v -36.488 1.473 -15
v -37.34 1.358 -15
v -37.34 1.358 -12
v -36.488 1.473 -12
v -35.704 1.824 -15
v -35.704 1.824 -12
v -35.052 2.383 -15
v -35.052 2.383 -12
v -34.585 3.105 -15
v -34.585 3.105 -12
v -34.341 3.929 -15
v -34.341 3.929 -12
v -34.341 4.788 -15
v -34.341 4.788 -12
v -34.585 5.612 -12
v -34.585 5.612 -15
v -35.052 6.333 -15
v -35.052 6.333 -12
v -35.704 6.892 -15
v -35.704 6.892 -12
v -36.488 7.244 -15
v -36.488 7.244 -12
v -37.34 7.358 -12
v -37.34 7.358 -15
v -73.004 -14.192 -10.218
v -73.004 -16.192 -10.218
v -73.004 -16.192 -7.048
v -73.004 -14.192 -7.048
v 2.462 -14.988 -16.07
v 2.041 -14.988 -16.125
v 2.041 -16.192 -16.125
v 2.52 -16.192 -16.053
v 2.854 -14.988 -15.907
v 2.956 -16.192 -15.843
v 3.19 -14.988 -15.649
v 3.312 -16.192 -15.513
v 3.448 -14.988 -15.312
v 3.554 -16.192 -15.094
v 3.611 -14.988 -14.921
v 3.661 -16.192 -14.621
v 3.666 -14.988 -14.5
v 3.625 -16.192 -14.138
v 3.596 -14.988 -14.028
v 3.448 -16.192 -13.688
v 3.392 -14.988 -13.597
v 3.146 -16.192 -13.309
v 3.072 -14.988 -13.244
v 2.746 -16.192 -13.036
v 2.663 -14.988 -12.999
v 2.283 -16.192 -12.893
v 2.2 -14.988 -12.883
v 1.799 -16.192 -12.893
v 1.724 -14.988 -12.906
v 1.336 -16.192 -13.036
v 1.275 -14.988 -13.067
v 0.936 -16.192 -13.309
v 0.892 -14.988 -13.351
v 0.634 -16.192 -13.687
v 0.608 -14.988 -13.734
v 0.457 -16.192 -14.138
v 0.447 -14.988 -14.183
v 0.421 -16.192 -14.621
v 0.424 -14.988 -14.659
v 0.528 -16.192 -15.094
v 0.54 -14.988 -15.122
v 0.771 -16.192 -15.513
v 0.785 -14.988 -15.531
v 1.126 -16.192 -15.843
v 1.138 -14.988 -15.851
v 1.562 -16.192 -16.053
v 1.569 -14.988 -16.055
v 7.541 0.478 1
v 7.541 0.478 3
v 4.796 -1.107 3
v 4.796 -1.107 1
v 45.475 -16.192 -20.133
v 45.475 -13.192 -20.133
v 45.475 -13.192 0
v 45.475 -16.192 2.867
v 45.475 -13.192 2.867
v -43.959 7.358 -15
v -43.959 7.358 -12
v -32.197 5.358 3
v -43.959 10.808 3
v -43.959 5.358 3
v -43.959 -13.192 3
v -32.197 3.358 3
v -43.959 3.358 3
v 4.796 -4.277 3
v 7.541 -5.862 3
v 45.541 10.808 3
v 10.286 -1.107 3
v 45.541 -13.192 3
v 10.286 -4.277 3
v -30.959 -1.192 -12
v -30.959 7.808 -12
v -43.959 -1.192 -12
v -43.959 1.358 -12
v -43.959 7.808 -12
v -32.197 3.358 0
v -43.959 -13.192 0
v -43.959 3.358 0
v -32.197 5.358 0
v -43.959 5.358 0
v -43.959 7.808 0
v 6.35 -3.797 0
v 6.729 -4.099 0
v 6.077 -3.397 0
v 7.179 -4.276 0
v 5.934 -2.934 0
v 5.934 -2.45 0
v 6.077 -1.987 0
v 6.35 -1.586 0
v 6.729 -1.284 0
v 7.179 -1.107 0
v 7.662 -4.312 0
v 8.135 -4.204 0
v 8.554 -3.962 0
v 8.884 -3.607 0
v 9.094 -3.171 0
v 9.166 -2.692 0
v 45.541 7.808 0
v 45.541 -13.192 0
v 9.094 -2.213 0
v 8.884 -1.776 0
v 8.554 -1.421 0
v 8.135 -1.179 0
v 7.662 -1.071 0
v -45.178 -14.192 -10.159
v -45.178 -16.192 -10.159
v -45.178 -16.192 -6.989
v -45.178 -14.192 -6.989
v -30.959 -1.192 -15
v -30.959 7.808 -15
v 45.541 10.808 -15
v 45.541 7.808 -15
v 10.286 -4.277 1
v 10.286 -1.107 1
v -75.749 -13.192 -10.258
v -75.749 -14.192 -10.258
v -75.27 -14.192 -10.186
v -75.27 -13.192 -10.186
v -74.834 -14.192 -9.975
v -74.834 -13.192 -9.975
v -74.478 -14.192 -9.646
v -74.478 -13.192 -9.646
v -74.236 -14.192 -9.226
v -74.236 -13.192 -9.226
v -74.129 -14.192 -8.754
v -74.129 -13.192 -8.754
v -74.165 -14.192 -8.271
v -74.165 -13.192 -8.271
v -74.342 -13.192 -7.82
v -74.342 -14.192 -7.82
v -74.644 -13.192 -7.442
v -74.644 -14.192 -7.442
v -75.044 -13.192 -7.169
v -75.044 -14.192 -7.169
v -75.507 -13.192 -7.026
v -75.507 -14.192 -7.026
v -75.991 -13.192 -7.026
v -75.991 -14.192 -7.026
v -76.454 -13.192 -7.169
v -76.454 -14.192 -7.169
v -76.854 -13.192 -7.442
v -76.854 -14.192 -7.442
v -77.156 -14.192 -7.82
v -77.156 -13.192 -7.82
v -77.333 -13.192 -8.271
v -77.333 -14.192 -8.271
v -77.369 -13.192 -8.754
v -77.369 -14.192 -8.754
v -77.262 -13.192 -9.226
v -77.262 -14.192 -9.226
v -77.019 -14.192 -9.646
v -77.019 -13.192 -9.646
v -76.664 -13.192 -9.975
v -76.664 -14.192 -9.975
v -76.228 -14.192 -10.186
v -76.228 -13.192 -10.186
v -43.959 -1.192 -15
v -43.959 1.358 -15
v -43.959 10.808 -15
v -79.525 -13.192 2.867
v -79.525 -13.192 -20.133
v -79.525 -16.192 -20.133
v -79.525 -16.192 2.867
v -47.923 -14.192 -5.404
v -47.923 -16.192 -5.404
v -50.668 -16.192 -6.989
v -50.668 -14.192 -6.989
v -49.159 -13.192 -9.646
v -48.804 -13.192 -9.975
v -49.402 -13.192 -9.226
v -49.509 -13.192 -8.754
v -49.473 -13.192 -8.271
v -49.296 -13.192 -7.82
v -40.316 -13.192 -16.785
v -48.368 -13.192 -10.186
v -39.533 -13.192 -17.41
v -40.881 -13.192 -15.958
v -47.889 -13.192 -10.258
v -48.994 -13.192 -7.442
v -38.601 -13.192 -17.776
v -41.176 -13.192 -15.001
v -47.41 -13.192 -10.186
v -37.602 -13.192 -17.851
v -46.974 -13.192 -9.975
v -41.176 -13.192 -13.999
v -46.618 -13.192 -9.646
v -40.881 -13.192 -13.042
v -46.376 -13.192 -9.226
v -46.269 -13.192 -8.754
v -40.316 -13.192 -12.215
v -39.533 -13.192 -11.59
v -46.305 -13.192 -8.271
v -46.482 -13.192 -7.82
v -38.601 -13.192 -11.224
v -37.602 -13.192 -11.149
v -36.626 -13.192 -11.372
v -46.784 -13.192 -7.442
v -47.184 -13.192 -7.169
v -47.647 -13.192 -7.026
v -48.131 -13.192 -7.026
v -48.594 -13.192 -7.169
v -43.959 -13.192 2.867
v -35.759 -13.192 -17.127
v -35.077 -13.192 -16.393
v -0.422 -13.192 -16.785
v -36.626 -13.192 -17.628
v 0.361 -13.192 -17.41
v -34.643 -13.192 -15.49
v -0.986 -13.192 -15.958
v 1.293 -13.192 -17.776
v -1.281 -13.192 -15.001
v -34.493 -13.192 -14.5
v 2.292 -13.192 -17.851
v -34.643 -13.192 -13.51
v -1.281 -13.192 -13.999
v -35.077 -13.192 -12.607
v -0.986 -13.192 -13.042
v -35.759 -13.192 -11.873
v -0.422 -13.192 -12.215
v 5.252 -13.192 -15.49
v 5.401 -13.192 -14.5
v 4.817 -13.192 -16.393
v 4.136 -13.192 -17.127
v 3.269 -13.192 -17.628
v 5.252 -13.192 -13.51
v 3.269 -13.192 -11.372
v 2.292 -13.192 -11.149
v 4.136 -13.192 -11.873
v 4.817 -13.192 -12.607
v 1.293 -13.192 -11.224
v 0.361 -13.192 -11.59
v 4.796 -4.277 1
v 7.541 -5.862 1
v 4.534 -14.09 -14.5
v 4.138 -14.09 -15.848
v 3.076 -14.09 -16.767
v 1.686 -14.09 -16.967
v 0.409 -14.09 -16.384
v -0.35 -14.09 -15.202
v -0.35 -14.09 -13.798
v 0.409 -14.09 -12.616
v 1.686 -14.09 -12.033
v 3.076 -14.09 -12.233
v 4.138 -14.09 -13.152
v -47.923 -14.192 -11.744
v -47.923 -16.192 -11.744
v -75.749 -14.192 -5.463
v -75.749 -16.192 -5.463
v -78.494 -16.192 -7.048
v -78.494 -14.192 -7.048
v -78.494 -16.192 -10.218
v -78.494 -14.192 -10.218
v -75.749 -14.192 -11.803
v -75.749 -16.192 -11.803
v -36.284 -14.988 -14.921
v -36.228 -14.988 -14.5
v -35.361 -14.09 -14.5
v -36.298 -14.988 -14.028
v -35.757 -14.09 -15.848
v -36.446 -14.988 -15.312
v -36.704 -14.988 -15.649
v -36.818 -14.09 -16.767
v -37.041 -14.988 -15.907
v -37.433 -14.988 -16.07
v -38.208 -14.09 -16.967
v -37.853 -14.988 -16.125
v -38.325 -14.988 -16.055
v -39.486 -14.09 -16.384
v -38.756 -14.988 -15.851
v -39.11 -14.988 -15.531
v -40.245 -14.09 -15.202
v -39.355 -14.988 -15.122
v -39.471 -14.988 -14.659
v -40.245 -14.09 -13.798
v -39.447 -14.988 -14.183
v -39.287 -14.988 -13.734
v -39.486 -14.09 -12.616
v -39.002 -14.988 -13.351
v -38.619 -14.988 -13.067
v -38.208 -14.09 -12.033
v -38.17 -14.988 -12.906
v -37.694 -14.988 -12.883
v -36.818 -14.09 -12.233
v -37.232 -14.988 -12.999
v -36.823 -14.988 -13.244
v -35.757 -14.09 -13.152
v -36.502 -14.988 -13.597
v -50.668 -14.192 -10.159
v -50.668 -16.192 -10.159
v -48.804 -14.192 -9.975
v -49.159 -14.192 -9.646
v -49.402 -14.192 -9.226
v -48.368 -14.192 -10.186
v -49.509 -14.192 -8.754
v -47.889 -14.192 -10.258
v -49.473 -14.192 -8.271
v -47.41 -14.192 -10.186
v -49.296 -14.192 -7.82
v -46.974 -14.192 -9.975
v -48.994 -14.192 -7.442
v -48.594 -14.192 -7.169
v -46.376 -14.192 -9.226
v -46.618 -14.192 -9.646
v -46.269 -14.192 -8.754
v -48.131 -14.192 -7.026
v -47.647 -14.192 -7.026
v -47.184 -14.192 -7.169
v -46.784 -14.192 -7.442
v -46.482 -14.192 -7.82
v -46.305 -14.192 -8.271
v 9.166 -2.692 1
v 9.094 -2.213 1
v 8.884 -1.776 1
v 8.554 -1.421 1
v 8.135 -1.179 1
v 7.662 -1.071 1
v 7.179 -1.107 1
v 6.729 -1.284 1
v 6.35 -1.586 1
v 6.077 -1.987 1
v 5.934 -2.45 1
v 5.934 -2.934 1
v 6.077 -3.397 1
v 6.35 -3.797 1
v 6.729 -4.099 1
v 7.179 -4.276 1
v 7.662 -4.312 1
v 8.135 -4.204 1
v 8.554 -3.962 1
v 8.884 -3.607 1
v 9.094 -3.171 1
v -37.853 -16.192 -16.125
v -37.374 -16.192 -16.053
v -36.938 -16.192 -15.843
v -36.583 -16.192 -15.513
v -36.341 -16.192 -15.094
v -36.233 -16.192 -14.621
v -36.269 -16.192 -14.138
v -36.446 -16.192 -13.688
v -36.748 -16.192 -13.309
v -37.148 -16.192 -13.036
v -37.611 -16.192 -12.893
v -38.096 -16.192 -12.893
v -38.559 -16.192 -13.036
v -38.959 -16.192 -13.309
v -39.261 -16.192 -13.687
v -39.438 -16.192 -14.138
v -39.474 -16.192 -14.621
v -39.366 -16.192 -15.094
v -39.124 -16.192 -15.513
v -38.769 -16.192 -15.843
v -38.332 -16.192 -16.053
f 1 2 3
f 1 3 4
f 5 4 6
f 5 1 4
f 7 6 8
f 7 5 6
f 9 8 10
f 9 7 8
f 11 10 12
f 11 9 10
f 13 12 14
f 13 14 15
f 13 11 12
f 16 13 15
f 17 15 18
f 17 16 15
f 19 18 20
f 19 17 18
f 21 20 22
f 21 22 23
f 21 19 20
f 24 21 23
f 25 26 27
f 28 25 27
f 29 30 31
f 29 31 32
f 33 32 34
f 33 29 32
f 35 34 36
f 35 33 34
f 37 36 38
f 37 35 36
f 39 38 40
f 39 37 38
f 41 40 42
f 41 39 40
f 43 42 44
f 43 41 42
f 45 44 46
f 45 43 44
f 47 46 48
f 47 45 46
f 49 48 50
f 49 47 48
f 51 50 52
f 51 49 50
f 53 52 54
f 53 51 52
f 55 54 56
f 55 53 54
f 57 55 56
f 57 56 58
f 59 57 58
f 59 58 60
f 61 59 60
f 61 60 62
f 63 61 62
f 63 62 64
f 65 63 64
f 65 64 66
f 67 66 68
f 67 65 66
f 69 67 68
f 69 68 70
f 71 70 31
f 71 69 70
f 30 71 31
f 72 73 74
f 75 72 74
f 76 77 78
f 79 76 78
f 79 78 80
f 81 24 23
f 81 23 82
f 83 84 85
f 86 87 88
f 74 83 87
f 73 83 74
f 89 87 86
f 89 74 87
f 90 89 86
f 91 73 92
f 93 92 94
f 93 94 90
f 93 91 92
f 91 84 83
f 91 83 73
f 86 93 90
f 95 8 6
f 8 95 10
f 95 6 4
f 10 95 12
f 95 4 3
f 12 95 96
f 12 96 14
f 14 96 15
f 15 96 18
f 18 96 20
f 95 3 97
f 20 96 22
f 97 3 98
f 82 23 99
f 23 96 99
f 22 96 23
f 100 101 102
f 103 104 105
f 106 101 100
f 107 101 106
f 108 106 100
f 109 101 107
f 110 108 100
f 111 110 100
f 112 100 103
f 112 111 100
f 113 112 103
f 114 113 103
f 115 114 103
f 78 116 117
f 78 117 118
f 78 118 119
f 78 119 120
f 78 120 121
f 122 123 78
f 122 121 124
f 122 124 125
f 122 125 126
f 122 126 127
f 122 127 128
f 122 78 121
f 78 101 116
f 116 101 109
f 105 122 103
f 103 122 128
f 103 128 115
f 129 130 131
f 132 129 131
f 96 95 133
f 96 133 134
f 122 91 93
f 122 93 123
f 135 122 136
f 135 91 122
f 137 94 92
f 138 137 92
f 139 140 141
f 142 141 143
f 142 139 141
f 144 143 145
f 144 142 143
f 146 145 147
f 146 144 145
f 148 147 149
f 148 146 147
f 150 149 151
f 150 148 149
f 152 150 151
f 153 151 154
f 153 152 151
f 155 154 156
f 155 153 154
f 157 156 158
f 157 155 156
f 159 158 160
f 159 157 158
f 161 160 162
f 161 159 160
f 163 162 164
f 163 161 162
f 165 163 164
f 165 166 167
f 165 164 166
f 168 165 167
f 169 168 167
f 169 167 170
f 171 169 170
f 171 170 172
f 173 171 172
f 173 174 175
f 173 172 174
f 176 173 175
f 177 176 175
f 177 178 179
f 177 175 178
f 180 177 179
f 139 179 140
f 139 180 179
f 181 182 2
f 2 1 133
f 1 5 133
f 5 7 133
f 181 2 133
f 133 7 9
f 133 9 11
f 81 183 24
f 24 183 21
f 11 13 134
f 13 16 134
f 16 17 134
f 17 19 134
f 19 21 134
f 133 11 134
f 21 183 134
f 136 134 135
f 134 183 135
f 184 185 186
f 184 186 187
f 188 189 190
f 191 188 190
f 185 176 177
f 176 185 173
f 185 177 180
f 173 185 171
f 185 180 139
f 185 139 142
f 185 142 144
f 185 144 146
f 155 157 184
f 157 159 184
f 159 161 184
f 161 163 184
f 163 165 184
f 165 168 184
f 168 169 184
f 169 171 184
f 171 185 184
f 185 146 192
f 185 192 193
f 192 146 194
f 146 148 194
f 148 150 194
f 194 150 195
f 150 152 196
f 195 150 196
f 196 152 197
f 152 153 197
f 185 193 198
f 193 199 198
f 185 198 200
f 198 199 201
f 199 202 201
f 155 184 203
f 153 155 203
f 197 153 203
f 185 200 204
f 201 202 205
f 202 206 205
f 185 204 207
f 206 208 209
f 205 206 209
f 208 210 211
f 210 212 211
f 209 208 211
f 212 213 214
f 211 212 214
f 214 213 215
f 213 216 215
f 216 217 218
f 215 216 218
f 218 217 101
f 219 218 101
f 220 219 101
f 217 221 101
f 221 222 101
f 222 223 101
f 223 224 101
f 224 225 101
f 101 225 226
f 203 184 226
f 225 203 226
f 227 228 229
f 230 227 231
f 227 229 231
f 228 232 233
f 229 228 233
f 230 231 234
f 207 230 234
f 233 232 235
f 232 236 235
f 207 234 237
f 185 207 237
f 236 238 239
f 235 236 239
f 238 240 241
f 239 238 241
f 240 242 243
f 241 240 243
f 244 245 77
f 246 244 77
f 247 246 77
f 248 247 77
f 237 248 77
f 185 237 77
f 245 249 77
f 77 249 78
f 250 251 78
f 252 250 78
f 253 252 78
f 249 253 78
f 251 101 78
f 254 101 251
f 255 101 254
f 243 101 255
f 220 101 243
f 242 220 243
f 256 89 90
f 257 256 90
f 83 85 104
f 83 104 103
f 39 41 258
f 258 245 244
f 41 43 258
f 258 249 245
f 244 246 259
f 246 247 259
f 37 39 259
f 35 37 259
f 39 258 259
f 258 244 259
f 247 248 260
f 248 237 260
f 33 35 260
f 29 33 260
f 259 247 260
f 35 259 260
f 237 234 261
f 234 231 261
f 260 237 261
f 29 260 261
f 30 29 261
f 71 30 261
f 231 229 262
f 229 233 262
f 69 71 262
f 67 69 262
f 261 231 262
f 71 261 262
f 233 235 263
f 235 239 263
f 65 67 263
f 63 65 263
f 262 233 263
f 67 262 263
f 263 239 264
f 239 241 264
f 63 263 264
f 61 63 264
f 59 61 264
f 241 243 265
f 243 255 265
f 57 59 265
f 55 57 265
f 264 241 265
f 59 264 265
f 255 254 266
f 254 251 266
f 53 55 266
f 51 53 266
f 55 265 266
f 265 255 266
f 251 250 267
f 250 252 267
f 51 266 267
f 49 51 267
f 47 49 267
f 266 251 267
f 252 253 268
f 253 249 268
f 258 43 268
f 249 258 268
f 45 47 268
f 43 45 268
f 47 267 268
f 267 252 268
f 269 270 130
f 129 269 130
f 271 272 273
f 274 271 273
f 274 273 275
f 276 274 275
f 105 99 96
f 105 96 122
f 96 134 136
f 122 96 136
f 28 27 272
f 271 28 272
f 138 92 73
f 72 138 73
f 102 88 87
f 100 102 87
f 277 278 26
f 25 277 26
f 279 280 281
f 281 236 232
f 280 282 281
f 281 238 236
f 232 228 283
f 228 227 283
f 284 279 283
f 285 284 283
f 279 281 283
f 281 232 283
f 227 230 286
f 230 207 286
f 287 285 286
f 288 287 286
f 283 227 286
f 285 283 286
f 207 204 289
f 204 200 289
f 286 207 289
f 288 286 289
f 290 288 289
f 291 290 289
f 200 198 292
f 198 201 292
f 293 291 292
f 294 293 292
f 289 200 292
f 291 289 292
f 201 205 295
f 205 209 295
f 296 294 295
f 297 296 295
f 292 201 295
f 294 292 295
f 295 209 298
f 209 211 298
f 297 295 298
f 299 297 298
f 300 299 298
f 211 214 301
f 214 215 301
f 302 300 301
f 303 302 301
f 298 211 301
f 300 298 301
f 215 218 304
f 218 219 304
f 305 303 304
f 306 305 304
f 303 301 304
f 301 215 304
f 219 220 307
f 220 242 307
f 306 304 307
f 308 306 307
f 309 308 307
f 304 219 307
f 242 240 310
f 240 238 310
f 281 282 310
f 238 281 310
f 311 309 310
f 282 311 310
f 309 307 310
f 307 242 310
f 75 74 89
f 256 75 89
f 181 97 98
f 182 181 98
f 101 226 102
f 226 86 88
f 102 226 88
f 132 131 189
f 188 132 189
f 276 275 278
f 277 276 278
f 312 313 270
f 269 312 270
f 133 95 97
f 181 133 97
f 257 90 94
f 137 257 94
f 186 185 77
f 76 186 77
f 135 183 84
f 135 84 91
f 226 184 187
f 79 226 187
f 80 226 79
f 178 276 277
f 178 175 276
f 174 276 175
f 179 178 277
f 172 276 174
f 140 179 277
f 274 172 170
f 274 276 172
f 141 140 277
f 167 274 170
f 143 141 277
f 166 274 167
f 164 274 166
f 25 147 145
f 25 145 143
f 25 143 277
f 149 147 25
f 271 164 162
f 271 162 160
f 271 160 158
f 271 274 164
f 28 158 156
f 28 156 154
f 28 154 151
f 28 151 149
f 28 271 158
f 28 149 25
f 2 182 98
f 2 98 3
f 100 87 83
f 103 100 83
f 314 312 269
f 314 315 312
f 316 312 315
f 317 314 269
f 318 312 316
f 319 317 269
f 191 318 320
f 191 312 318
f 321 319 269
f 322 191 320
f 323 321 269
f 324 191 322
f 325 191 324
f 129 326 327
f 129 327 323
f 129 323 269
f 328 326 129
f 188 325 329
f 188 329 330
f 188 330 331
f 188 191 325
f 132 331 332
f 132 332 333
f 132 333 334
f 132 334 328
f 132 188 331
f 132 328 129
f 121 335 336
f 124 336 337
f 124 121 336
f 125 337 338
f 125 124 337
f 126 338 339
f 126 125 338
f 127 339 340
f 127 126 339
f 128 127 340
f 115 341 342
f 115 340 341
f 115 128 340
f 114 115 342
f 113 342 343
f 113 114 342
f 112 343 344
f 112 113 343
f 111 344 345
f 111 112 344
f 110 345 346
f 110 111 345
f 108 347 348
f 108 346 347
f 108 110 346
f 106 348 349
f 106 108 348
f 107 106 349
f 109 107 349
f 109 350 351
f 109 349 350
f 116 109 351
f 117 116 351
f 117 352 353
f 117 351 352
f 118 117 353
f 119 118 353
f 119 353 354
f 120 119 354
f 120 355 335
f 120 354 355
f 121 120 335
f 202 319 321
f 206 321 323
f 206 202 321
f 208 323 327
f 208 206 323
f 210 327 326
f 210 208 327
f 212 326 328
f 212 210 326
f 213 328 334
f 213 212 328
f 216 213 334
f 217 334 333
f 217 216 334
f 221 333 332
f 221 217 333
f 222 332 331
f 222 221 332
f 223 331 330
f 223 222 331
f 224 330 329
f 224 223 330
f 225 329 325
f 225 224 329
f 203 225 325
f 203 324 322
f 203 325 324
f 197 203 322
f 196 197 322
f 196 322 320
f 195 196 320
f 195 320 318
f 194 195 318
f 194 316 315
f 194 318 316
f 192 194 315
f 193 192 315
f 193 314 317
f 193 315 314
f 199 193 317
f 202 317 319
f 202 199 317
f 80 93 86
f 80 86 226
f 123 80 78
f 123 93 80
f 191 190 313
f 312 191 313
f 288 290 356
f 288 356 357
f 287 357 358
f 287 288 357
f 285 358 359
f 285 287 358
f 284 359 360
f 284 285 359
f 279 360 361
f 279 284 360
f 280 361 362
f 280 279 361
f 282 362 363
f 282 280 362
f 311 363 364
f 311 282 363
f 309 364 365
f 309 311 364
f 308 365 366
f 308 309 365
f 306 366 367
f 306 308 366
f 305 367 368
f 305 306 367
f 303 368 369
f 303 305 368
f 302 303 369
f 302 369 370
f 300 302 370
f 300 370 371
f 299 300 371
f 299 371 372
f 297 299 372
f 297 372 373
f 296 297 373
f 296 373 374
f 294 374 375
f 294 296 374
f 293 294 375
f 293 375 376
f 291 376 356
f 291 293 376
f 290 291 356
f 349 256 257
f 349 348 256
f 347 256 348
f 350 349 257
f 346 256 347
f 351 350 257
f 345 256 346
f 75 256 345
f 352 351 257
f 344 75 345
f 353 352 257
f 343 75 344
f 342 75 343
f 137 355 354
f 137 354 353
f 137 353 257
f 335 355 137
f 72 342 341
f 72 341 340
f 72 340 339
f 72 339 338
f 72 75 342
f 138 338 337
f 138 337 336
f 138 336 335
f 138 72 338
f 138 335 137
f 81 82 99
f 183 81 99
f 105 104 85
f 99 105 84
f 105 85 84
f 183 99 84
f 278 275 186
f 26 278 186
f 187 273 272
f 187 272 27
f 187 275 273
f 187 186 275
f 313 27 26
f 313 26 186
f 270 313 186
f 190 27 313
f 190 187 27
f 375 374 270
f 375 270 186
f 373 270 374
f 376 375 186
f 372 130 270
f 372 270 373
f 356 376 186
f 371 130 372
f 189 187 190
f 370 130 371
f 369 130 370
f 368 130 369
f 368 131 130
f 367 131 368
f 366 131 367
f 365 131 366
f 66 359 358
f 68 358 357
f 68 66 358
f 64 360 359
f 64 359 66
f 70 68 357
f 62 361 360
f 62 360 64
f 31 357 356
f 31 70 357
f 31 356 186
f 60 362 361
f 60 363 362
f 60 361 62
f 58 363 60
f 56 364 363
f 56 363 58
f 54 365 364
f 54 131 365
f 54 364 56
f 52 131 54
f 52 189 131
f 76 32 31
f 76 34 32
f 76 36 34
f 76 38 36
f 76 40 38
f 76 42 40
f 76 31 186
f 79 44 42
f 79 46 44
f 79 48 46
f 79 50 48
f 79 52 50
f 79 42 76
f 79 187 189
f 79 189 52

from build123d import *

# Parameters (mm, degrees)
CROQUIS1_R                      = 1.625
SALIENTE_EXTRUIR1_DEPTH         = 3
CORTAR_EXTRUIR1_DEPTH           = 2
CROQUIS3_W                      = 125
CROQUIS3_H                      = 23
CROQUIS3_R                      = 1.625
SALIENTE_EXTRUIR2_DEPTH         = 3
CROQUIS4_W                      = 76
CROQUIS4_H                      = 15
SALIENTE_EXTRUIR3_DEPTH         = 3
SALIENTE_EXTRUIR5_DEPTH         = 13.5
CROQUIS18_W                     = 13
CROQUIS18_H                     = 12
SALIENTE_EXTRUIR6_DEPTH         = 3
CORTAR_EXTRUIR6_DEPTH           = 3
CROQUIS21_W                     = 76.5
CROQUIS21_H                     = 3
SALIENTE_EXTRUIR7_DEPTH         = 3
CROQUIS23_W                     = 11.762217651
CROQUIS23_H                     = 2
CORTAR_EXTRUIR7_DEPTH           = 3
CROQUIS24_R                     = 3.35997123
CORTAR_EXTRUIR8_DEPTH           = 1.8
CORTAR_EXTRUIR8_DRAFT           = -44
CORTAR_EXTRUIR8_PROFILE_2_DEPTH = 1.8
CORTAR_EXTRUIR8_PROFILE_2_DRAFT = -44
CORTAR_EXTRUIR9_DEPTH           = 2


with BuildPart() as part:
    # Croquis1 → Saliente-Extruir1 (new body)
    with BuildSketch(Plane.XY):
        Polygon((7.541029965, -13.191741873), (45.541029965, -13.191741873), (45.541029965, 7.808258127), (-30.458970035, 7.808258127), (-30.458970035, -13.191741873), align=None)
        with Locations((7.541029965, -2.691741873)):
            Circle(CROQUIS1_R, mode=Mode.SUBTRACT)
    extrude(amount=SALIENTE_EXTRUIR1_DEPTH)

    # Croquis2 → Cortar-Extruir1 (cut)
    with BuildSketch(Plane.XY.offset(3)):
        Polygon((7.541029965, 0.478258127), (4.795729435, -1.106741873), (4.795729435, -4.276741873), (7.541029965, -5.861741873), (10.286330495, -4.276741873), (10.286330495, -1.106741873), align=None)
    extrude(amount=-CORTAR_EXTRUIR1_DEPTH, mode=Mode.SUBTRACT)

    # Croquis3 → Saliente-Extruir2 (add)
    with BuildSketch(Plane.XZ.offset(13.191741873)):
        with Locations((-17.025379291, -8.632818511)):
            Rectangle(CROQUIS3_W, CROQUIS3_H)
        with Locations(Location((2.041029965, -14.5, 0), (0, 0, 270))):
            Circle(CROQUIS3_R, mode=Mode.SUBTRACT)
        with Locations(Location((-37.853447155, -14.5, 0), (0, 0, 270))):
            Circle(CROQUIS3_R, mode=Mode.SUBTRACT)
        with Locations(Location((-75.748970035, -8.632818511, 0), (0, 0, 270))):
            Circle(CROQUIS3_R, mode=Mode.SUBTRACT)
        with Locations(Location((-47.888970035, -8.632818511, 0), (0, 0, 270))):
            Circle(CROQUIS3_R, mode=Mode.SUBTRACT)
    extrude(amount=SALIENTE_EXTRUIR2_DEPTH)

    # Croquis4 → Saliente-Extruir3 (add)
    with BuildSketch(Plane(origin=(0, 7.808258127, 0), x_dir=(1, 0, 0), z_dir=(0, 1, 0))):
        with Locations((7.541029965, 4.5)):
            Rectangle(CROQUIS4_W, CROQUIS4_H)
    extrude(amount=SALIENTE_EXTRUIR3_DEPTH)

    # Croquis14 → Saliente-Extruir5 (add)
    with BuildSketch(Plane.ZY.offset(30.458970035)):
        Polygon((-12, 10.808258127), (3, 10.808258127), (3, -13.191741873), (0, -13.191741873), (0, 7.808258127), (-12, 7.808258127), align=None)
    extrude(amount=SALIENTE_EXTRUIR5_DEPTH)

    # Croquis18 → Saliente-Extruir6 (add)
    with BuildSketch(Plane(origin=(0, 0, -12), x_dir=(-1, 0, 0), z_dir=(0, 0, -1))):
        with Locations((37.458970035, 4.808258127)):
            Rectangle(CROQUIS18_W, CROQUIS18_H)
    extrude(amount=SALIENTE_EXTRUIR6_DEPTH)

    # Croquis19 → Cortar-Extruir6 (cut)
    with BuildSketch(Plane(origin=(0, 0, -15), x_dir=(-1, 0, 0), z_dir=(0, 0, -1))):
        with BuildLine():
            Line((37.340127553, 7.35825754), (43.958970035, 7.35825754))
            Line((43.958970035, 7.35825754), (43.958970035, 1.358257834))
            Line((43.958970035, 1.358257834), (37.340127553, 1.358257834))
            ThreePointArc((37.340127553, 1.358257834), (34.310076321, 4.358257687), (37.340127553, 7.35825754))
        make_face()
    extrude(amount=-CORTAR_EXTRUIR6_DEPTH, mode=Mode.SUBTRACT)

    # Croquis21 → Saliente-Extruir7 (add)
    with BuildSketch(Plane(origin=(0, 10.808258127, 0), x_dir=(1, 0, 0), z_dir=(0, 1, 0))):
        with Locations((7.291029965, 13.5)):
            Rectangle(CROQUIS21_W, CROQUIS21_H)
    extrude(amount=-SALIENTE_EXTRUIR7_DEPTH)

    # Croquis23 → Cortar-Extruir7 (cut)
    with BuildSketch(Plane.XY.offset(3)):
        with Locations((-38.077861209, 4.358257834)):
            Rectangle(CROQUIS23_W, CROQUIS23_H)
    extrude(amount=-CORTAR_EXTRUIR7_DEPTH, mode=Mode.SUBTRACT)


with BuildPart() as cortar_extruir8_tool:
    # Croquis24 → Cortar-Extruir8 (with draft: the straight prism first)
    with BuildSketch(Plane(origin=(0, -13.191741873, 0), x_dir=(1, 0, 0), z_dir=(0, 1, 0))):
        with Locations((2.041029965, 14.5)):
            Circle(CROQUIS24_R)
    extrude(amount=-CORTAR_EXTRUIR8_DEPTH)
    # Cortar-Extruir8: the draft: its side faces are tilted about the plane it starts from
    cortar_extruir8_sides = [cortar_extruir8_tool.faces().sort_by_distance(p)[0] for p in [
        (-1.318941265, -14.091741873, -14.5),
    ]]
    draft(cortar_extruir8_sides, Plane(origin=(0, -13.191741873, 0), x_dir=(1, 0, 0), z_dir=(0, 1, 0)), CORTAR_EXTRUIR8_DRAFT)


with BuildPart() as part_1:
    add(part.part)

    # Cortar-Extruir8: cut by cortar_extruir8_tool
    add(cortar_extruir8_tool.part, mode=Mode.SUBTRACT)


with BuildPart() as cortar_extruir8_profile_2_tool:
    # Croquis24 → Cortar-Extruir8 profile 2 (with draft: the straight prism first)
    with BuildSketch(Plane(origin=(0, -13.191741873, 0), x_dir=(1, 0, 0), z_dir=(0, 1, 0))):
        with Locations((-37.853447155, 14.5)):
            Circle(CROQUIS24_R)
    extrude(amount=-CORTAR_EXTRUIR8_PROFILE_2_DEPTH)
    # Cortar-Extruir8 profile 2: the draft: its side faces are tilted about the plane it starts from
    cortar_extruir8_profile_2_sides = [cortar_extruir8_profile_2_tool.faces().sort_by_distance(p)[0] for p in [
        (-41.213418385, -14.091741873, -14.5),
    ]]
    draft(cortar_extruir8_profile_2_sides, Plane(origin=(0, -13.191741873, 0), x_dir=(1, 0, 0), z_dir=(0, 1, 0)), CORTAR_EXTRUIR8_PROFILE_2_DRAFT)


with BuildPart() as part_2:
    add(part_1.part)

    # Cortar-Extruir8 profile 2: cut by cortar_extruir8_profile_2_tool
    add(cortar_extruir8_profile_2_tool.part, mode=Mode.SUBTRACT)

    # Croquis25 → Cortar-Extruir9 (cut)
    with BuildSketch(Plane.XZ.offset(16.191741873)):
        Polygon((-47.922954999, -5.403954828), (-50.668255529, -6.988954828), (-50.668255529, -10.158954828), (-47.922954999, -11.743954828), (-45.177654469, -10.158954828), (-45.177654469, -6.988954828), align=None)
        Polygon((-75.748970035, -5.462818511), (-78.494270565, -7.047818511), (-78.494270565, -10.217818511), (-75.748970035, -11.802818511), (-73.003669505, -10.217818511), (-73.003669505, -7.047818511), align=None)
    extrude(amount=-CORTAR_EXTRUIR9_DEPTH, mode=Mode.SUBTRACT)


solid = part_2.part
